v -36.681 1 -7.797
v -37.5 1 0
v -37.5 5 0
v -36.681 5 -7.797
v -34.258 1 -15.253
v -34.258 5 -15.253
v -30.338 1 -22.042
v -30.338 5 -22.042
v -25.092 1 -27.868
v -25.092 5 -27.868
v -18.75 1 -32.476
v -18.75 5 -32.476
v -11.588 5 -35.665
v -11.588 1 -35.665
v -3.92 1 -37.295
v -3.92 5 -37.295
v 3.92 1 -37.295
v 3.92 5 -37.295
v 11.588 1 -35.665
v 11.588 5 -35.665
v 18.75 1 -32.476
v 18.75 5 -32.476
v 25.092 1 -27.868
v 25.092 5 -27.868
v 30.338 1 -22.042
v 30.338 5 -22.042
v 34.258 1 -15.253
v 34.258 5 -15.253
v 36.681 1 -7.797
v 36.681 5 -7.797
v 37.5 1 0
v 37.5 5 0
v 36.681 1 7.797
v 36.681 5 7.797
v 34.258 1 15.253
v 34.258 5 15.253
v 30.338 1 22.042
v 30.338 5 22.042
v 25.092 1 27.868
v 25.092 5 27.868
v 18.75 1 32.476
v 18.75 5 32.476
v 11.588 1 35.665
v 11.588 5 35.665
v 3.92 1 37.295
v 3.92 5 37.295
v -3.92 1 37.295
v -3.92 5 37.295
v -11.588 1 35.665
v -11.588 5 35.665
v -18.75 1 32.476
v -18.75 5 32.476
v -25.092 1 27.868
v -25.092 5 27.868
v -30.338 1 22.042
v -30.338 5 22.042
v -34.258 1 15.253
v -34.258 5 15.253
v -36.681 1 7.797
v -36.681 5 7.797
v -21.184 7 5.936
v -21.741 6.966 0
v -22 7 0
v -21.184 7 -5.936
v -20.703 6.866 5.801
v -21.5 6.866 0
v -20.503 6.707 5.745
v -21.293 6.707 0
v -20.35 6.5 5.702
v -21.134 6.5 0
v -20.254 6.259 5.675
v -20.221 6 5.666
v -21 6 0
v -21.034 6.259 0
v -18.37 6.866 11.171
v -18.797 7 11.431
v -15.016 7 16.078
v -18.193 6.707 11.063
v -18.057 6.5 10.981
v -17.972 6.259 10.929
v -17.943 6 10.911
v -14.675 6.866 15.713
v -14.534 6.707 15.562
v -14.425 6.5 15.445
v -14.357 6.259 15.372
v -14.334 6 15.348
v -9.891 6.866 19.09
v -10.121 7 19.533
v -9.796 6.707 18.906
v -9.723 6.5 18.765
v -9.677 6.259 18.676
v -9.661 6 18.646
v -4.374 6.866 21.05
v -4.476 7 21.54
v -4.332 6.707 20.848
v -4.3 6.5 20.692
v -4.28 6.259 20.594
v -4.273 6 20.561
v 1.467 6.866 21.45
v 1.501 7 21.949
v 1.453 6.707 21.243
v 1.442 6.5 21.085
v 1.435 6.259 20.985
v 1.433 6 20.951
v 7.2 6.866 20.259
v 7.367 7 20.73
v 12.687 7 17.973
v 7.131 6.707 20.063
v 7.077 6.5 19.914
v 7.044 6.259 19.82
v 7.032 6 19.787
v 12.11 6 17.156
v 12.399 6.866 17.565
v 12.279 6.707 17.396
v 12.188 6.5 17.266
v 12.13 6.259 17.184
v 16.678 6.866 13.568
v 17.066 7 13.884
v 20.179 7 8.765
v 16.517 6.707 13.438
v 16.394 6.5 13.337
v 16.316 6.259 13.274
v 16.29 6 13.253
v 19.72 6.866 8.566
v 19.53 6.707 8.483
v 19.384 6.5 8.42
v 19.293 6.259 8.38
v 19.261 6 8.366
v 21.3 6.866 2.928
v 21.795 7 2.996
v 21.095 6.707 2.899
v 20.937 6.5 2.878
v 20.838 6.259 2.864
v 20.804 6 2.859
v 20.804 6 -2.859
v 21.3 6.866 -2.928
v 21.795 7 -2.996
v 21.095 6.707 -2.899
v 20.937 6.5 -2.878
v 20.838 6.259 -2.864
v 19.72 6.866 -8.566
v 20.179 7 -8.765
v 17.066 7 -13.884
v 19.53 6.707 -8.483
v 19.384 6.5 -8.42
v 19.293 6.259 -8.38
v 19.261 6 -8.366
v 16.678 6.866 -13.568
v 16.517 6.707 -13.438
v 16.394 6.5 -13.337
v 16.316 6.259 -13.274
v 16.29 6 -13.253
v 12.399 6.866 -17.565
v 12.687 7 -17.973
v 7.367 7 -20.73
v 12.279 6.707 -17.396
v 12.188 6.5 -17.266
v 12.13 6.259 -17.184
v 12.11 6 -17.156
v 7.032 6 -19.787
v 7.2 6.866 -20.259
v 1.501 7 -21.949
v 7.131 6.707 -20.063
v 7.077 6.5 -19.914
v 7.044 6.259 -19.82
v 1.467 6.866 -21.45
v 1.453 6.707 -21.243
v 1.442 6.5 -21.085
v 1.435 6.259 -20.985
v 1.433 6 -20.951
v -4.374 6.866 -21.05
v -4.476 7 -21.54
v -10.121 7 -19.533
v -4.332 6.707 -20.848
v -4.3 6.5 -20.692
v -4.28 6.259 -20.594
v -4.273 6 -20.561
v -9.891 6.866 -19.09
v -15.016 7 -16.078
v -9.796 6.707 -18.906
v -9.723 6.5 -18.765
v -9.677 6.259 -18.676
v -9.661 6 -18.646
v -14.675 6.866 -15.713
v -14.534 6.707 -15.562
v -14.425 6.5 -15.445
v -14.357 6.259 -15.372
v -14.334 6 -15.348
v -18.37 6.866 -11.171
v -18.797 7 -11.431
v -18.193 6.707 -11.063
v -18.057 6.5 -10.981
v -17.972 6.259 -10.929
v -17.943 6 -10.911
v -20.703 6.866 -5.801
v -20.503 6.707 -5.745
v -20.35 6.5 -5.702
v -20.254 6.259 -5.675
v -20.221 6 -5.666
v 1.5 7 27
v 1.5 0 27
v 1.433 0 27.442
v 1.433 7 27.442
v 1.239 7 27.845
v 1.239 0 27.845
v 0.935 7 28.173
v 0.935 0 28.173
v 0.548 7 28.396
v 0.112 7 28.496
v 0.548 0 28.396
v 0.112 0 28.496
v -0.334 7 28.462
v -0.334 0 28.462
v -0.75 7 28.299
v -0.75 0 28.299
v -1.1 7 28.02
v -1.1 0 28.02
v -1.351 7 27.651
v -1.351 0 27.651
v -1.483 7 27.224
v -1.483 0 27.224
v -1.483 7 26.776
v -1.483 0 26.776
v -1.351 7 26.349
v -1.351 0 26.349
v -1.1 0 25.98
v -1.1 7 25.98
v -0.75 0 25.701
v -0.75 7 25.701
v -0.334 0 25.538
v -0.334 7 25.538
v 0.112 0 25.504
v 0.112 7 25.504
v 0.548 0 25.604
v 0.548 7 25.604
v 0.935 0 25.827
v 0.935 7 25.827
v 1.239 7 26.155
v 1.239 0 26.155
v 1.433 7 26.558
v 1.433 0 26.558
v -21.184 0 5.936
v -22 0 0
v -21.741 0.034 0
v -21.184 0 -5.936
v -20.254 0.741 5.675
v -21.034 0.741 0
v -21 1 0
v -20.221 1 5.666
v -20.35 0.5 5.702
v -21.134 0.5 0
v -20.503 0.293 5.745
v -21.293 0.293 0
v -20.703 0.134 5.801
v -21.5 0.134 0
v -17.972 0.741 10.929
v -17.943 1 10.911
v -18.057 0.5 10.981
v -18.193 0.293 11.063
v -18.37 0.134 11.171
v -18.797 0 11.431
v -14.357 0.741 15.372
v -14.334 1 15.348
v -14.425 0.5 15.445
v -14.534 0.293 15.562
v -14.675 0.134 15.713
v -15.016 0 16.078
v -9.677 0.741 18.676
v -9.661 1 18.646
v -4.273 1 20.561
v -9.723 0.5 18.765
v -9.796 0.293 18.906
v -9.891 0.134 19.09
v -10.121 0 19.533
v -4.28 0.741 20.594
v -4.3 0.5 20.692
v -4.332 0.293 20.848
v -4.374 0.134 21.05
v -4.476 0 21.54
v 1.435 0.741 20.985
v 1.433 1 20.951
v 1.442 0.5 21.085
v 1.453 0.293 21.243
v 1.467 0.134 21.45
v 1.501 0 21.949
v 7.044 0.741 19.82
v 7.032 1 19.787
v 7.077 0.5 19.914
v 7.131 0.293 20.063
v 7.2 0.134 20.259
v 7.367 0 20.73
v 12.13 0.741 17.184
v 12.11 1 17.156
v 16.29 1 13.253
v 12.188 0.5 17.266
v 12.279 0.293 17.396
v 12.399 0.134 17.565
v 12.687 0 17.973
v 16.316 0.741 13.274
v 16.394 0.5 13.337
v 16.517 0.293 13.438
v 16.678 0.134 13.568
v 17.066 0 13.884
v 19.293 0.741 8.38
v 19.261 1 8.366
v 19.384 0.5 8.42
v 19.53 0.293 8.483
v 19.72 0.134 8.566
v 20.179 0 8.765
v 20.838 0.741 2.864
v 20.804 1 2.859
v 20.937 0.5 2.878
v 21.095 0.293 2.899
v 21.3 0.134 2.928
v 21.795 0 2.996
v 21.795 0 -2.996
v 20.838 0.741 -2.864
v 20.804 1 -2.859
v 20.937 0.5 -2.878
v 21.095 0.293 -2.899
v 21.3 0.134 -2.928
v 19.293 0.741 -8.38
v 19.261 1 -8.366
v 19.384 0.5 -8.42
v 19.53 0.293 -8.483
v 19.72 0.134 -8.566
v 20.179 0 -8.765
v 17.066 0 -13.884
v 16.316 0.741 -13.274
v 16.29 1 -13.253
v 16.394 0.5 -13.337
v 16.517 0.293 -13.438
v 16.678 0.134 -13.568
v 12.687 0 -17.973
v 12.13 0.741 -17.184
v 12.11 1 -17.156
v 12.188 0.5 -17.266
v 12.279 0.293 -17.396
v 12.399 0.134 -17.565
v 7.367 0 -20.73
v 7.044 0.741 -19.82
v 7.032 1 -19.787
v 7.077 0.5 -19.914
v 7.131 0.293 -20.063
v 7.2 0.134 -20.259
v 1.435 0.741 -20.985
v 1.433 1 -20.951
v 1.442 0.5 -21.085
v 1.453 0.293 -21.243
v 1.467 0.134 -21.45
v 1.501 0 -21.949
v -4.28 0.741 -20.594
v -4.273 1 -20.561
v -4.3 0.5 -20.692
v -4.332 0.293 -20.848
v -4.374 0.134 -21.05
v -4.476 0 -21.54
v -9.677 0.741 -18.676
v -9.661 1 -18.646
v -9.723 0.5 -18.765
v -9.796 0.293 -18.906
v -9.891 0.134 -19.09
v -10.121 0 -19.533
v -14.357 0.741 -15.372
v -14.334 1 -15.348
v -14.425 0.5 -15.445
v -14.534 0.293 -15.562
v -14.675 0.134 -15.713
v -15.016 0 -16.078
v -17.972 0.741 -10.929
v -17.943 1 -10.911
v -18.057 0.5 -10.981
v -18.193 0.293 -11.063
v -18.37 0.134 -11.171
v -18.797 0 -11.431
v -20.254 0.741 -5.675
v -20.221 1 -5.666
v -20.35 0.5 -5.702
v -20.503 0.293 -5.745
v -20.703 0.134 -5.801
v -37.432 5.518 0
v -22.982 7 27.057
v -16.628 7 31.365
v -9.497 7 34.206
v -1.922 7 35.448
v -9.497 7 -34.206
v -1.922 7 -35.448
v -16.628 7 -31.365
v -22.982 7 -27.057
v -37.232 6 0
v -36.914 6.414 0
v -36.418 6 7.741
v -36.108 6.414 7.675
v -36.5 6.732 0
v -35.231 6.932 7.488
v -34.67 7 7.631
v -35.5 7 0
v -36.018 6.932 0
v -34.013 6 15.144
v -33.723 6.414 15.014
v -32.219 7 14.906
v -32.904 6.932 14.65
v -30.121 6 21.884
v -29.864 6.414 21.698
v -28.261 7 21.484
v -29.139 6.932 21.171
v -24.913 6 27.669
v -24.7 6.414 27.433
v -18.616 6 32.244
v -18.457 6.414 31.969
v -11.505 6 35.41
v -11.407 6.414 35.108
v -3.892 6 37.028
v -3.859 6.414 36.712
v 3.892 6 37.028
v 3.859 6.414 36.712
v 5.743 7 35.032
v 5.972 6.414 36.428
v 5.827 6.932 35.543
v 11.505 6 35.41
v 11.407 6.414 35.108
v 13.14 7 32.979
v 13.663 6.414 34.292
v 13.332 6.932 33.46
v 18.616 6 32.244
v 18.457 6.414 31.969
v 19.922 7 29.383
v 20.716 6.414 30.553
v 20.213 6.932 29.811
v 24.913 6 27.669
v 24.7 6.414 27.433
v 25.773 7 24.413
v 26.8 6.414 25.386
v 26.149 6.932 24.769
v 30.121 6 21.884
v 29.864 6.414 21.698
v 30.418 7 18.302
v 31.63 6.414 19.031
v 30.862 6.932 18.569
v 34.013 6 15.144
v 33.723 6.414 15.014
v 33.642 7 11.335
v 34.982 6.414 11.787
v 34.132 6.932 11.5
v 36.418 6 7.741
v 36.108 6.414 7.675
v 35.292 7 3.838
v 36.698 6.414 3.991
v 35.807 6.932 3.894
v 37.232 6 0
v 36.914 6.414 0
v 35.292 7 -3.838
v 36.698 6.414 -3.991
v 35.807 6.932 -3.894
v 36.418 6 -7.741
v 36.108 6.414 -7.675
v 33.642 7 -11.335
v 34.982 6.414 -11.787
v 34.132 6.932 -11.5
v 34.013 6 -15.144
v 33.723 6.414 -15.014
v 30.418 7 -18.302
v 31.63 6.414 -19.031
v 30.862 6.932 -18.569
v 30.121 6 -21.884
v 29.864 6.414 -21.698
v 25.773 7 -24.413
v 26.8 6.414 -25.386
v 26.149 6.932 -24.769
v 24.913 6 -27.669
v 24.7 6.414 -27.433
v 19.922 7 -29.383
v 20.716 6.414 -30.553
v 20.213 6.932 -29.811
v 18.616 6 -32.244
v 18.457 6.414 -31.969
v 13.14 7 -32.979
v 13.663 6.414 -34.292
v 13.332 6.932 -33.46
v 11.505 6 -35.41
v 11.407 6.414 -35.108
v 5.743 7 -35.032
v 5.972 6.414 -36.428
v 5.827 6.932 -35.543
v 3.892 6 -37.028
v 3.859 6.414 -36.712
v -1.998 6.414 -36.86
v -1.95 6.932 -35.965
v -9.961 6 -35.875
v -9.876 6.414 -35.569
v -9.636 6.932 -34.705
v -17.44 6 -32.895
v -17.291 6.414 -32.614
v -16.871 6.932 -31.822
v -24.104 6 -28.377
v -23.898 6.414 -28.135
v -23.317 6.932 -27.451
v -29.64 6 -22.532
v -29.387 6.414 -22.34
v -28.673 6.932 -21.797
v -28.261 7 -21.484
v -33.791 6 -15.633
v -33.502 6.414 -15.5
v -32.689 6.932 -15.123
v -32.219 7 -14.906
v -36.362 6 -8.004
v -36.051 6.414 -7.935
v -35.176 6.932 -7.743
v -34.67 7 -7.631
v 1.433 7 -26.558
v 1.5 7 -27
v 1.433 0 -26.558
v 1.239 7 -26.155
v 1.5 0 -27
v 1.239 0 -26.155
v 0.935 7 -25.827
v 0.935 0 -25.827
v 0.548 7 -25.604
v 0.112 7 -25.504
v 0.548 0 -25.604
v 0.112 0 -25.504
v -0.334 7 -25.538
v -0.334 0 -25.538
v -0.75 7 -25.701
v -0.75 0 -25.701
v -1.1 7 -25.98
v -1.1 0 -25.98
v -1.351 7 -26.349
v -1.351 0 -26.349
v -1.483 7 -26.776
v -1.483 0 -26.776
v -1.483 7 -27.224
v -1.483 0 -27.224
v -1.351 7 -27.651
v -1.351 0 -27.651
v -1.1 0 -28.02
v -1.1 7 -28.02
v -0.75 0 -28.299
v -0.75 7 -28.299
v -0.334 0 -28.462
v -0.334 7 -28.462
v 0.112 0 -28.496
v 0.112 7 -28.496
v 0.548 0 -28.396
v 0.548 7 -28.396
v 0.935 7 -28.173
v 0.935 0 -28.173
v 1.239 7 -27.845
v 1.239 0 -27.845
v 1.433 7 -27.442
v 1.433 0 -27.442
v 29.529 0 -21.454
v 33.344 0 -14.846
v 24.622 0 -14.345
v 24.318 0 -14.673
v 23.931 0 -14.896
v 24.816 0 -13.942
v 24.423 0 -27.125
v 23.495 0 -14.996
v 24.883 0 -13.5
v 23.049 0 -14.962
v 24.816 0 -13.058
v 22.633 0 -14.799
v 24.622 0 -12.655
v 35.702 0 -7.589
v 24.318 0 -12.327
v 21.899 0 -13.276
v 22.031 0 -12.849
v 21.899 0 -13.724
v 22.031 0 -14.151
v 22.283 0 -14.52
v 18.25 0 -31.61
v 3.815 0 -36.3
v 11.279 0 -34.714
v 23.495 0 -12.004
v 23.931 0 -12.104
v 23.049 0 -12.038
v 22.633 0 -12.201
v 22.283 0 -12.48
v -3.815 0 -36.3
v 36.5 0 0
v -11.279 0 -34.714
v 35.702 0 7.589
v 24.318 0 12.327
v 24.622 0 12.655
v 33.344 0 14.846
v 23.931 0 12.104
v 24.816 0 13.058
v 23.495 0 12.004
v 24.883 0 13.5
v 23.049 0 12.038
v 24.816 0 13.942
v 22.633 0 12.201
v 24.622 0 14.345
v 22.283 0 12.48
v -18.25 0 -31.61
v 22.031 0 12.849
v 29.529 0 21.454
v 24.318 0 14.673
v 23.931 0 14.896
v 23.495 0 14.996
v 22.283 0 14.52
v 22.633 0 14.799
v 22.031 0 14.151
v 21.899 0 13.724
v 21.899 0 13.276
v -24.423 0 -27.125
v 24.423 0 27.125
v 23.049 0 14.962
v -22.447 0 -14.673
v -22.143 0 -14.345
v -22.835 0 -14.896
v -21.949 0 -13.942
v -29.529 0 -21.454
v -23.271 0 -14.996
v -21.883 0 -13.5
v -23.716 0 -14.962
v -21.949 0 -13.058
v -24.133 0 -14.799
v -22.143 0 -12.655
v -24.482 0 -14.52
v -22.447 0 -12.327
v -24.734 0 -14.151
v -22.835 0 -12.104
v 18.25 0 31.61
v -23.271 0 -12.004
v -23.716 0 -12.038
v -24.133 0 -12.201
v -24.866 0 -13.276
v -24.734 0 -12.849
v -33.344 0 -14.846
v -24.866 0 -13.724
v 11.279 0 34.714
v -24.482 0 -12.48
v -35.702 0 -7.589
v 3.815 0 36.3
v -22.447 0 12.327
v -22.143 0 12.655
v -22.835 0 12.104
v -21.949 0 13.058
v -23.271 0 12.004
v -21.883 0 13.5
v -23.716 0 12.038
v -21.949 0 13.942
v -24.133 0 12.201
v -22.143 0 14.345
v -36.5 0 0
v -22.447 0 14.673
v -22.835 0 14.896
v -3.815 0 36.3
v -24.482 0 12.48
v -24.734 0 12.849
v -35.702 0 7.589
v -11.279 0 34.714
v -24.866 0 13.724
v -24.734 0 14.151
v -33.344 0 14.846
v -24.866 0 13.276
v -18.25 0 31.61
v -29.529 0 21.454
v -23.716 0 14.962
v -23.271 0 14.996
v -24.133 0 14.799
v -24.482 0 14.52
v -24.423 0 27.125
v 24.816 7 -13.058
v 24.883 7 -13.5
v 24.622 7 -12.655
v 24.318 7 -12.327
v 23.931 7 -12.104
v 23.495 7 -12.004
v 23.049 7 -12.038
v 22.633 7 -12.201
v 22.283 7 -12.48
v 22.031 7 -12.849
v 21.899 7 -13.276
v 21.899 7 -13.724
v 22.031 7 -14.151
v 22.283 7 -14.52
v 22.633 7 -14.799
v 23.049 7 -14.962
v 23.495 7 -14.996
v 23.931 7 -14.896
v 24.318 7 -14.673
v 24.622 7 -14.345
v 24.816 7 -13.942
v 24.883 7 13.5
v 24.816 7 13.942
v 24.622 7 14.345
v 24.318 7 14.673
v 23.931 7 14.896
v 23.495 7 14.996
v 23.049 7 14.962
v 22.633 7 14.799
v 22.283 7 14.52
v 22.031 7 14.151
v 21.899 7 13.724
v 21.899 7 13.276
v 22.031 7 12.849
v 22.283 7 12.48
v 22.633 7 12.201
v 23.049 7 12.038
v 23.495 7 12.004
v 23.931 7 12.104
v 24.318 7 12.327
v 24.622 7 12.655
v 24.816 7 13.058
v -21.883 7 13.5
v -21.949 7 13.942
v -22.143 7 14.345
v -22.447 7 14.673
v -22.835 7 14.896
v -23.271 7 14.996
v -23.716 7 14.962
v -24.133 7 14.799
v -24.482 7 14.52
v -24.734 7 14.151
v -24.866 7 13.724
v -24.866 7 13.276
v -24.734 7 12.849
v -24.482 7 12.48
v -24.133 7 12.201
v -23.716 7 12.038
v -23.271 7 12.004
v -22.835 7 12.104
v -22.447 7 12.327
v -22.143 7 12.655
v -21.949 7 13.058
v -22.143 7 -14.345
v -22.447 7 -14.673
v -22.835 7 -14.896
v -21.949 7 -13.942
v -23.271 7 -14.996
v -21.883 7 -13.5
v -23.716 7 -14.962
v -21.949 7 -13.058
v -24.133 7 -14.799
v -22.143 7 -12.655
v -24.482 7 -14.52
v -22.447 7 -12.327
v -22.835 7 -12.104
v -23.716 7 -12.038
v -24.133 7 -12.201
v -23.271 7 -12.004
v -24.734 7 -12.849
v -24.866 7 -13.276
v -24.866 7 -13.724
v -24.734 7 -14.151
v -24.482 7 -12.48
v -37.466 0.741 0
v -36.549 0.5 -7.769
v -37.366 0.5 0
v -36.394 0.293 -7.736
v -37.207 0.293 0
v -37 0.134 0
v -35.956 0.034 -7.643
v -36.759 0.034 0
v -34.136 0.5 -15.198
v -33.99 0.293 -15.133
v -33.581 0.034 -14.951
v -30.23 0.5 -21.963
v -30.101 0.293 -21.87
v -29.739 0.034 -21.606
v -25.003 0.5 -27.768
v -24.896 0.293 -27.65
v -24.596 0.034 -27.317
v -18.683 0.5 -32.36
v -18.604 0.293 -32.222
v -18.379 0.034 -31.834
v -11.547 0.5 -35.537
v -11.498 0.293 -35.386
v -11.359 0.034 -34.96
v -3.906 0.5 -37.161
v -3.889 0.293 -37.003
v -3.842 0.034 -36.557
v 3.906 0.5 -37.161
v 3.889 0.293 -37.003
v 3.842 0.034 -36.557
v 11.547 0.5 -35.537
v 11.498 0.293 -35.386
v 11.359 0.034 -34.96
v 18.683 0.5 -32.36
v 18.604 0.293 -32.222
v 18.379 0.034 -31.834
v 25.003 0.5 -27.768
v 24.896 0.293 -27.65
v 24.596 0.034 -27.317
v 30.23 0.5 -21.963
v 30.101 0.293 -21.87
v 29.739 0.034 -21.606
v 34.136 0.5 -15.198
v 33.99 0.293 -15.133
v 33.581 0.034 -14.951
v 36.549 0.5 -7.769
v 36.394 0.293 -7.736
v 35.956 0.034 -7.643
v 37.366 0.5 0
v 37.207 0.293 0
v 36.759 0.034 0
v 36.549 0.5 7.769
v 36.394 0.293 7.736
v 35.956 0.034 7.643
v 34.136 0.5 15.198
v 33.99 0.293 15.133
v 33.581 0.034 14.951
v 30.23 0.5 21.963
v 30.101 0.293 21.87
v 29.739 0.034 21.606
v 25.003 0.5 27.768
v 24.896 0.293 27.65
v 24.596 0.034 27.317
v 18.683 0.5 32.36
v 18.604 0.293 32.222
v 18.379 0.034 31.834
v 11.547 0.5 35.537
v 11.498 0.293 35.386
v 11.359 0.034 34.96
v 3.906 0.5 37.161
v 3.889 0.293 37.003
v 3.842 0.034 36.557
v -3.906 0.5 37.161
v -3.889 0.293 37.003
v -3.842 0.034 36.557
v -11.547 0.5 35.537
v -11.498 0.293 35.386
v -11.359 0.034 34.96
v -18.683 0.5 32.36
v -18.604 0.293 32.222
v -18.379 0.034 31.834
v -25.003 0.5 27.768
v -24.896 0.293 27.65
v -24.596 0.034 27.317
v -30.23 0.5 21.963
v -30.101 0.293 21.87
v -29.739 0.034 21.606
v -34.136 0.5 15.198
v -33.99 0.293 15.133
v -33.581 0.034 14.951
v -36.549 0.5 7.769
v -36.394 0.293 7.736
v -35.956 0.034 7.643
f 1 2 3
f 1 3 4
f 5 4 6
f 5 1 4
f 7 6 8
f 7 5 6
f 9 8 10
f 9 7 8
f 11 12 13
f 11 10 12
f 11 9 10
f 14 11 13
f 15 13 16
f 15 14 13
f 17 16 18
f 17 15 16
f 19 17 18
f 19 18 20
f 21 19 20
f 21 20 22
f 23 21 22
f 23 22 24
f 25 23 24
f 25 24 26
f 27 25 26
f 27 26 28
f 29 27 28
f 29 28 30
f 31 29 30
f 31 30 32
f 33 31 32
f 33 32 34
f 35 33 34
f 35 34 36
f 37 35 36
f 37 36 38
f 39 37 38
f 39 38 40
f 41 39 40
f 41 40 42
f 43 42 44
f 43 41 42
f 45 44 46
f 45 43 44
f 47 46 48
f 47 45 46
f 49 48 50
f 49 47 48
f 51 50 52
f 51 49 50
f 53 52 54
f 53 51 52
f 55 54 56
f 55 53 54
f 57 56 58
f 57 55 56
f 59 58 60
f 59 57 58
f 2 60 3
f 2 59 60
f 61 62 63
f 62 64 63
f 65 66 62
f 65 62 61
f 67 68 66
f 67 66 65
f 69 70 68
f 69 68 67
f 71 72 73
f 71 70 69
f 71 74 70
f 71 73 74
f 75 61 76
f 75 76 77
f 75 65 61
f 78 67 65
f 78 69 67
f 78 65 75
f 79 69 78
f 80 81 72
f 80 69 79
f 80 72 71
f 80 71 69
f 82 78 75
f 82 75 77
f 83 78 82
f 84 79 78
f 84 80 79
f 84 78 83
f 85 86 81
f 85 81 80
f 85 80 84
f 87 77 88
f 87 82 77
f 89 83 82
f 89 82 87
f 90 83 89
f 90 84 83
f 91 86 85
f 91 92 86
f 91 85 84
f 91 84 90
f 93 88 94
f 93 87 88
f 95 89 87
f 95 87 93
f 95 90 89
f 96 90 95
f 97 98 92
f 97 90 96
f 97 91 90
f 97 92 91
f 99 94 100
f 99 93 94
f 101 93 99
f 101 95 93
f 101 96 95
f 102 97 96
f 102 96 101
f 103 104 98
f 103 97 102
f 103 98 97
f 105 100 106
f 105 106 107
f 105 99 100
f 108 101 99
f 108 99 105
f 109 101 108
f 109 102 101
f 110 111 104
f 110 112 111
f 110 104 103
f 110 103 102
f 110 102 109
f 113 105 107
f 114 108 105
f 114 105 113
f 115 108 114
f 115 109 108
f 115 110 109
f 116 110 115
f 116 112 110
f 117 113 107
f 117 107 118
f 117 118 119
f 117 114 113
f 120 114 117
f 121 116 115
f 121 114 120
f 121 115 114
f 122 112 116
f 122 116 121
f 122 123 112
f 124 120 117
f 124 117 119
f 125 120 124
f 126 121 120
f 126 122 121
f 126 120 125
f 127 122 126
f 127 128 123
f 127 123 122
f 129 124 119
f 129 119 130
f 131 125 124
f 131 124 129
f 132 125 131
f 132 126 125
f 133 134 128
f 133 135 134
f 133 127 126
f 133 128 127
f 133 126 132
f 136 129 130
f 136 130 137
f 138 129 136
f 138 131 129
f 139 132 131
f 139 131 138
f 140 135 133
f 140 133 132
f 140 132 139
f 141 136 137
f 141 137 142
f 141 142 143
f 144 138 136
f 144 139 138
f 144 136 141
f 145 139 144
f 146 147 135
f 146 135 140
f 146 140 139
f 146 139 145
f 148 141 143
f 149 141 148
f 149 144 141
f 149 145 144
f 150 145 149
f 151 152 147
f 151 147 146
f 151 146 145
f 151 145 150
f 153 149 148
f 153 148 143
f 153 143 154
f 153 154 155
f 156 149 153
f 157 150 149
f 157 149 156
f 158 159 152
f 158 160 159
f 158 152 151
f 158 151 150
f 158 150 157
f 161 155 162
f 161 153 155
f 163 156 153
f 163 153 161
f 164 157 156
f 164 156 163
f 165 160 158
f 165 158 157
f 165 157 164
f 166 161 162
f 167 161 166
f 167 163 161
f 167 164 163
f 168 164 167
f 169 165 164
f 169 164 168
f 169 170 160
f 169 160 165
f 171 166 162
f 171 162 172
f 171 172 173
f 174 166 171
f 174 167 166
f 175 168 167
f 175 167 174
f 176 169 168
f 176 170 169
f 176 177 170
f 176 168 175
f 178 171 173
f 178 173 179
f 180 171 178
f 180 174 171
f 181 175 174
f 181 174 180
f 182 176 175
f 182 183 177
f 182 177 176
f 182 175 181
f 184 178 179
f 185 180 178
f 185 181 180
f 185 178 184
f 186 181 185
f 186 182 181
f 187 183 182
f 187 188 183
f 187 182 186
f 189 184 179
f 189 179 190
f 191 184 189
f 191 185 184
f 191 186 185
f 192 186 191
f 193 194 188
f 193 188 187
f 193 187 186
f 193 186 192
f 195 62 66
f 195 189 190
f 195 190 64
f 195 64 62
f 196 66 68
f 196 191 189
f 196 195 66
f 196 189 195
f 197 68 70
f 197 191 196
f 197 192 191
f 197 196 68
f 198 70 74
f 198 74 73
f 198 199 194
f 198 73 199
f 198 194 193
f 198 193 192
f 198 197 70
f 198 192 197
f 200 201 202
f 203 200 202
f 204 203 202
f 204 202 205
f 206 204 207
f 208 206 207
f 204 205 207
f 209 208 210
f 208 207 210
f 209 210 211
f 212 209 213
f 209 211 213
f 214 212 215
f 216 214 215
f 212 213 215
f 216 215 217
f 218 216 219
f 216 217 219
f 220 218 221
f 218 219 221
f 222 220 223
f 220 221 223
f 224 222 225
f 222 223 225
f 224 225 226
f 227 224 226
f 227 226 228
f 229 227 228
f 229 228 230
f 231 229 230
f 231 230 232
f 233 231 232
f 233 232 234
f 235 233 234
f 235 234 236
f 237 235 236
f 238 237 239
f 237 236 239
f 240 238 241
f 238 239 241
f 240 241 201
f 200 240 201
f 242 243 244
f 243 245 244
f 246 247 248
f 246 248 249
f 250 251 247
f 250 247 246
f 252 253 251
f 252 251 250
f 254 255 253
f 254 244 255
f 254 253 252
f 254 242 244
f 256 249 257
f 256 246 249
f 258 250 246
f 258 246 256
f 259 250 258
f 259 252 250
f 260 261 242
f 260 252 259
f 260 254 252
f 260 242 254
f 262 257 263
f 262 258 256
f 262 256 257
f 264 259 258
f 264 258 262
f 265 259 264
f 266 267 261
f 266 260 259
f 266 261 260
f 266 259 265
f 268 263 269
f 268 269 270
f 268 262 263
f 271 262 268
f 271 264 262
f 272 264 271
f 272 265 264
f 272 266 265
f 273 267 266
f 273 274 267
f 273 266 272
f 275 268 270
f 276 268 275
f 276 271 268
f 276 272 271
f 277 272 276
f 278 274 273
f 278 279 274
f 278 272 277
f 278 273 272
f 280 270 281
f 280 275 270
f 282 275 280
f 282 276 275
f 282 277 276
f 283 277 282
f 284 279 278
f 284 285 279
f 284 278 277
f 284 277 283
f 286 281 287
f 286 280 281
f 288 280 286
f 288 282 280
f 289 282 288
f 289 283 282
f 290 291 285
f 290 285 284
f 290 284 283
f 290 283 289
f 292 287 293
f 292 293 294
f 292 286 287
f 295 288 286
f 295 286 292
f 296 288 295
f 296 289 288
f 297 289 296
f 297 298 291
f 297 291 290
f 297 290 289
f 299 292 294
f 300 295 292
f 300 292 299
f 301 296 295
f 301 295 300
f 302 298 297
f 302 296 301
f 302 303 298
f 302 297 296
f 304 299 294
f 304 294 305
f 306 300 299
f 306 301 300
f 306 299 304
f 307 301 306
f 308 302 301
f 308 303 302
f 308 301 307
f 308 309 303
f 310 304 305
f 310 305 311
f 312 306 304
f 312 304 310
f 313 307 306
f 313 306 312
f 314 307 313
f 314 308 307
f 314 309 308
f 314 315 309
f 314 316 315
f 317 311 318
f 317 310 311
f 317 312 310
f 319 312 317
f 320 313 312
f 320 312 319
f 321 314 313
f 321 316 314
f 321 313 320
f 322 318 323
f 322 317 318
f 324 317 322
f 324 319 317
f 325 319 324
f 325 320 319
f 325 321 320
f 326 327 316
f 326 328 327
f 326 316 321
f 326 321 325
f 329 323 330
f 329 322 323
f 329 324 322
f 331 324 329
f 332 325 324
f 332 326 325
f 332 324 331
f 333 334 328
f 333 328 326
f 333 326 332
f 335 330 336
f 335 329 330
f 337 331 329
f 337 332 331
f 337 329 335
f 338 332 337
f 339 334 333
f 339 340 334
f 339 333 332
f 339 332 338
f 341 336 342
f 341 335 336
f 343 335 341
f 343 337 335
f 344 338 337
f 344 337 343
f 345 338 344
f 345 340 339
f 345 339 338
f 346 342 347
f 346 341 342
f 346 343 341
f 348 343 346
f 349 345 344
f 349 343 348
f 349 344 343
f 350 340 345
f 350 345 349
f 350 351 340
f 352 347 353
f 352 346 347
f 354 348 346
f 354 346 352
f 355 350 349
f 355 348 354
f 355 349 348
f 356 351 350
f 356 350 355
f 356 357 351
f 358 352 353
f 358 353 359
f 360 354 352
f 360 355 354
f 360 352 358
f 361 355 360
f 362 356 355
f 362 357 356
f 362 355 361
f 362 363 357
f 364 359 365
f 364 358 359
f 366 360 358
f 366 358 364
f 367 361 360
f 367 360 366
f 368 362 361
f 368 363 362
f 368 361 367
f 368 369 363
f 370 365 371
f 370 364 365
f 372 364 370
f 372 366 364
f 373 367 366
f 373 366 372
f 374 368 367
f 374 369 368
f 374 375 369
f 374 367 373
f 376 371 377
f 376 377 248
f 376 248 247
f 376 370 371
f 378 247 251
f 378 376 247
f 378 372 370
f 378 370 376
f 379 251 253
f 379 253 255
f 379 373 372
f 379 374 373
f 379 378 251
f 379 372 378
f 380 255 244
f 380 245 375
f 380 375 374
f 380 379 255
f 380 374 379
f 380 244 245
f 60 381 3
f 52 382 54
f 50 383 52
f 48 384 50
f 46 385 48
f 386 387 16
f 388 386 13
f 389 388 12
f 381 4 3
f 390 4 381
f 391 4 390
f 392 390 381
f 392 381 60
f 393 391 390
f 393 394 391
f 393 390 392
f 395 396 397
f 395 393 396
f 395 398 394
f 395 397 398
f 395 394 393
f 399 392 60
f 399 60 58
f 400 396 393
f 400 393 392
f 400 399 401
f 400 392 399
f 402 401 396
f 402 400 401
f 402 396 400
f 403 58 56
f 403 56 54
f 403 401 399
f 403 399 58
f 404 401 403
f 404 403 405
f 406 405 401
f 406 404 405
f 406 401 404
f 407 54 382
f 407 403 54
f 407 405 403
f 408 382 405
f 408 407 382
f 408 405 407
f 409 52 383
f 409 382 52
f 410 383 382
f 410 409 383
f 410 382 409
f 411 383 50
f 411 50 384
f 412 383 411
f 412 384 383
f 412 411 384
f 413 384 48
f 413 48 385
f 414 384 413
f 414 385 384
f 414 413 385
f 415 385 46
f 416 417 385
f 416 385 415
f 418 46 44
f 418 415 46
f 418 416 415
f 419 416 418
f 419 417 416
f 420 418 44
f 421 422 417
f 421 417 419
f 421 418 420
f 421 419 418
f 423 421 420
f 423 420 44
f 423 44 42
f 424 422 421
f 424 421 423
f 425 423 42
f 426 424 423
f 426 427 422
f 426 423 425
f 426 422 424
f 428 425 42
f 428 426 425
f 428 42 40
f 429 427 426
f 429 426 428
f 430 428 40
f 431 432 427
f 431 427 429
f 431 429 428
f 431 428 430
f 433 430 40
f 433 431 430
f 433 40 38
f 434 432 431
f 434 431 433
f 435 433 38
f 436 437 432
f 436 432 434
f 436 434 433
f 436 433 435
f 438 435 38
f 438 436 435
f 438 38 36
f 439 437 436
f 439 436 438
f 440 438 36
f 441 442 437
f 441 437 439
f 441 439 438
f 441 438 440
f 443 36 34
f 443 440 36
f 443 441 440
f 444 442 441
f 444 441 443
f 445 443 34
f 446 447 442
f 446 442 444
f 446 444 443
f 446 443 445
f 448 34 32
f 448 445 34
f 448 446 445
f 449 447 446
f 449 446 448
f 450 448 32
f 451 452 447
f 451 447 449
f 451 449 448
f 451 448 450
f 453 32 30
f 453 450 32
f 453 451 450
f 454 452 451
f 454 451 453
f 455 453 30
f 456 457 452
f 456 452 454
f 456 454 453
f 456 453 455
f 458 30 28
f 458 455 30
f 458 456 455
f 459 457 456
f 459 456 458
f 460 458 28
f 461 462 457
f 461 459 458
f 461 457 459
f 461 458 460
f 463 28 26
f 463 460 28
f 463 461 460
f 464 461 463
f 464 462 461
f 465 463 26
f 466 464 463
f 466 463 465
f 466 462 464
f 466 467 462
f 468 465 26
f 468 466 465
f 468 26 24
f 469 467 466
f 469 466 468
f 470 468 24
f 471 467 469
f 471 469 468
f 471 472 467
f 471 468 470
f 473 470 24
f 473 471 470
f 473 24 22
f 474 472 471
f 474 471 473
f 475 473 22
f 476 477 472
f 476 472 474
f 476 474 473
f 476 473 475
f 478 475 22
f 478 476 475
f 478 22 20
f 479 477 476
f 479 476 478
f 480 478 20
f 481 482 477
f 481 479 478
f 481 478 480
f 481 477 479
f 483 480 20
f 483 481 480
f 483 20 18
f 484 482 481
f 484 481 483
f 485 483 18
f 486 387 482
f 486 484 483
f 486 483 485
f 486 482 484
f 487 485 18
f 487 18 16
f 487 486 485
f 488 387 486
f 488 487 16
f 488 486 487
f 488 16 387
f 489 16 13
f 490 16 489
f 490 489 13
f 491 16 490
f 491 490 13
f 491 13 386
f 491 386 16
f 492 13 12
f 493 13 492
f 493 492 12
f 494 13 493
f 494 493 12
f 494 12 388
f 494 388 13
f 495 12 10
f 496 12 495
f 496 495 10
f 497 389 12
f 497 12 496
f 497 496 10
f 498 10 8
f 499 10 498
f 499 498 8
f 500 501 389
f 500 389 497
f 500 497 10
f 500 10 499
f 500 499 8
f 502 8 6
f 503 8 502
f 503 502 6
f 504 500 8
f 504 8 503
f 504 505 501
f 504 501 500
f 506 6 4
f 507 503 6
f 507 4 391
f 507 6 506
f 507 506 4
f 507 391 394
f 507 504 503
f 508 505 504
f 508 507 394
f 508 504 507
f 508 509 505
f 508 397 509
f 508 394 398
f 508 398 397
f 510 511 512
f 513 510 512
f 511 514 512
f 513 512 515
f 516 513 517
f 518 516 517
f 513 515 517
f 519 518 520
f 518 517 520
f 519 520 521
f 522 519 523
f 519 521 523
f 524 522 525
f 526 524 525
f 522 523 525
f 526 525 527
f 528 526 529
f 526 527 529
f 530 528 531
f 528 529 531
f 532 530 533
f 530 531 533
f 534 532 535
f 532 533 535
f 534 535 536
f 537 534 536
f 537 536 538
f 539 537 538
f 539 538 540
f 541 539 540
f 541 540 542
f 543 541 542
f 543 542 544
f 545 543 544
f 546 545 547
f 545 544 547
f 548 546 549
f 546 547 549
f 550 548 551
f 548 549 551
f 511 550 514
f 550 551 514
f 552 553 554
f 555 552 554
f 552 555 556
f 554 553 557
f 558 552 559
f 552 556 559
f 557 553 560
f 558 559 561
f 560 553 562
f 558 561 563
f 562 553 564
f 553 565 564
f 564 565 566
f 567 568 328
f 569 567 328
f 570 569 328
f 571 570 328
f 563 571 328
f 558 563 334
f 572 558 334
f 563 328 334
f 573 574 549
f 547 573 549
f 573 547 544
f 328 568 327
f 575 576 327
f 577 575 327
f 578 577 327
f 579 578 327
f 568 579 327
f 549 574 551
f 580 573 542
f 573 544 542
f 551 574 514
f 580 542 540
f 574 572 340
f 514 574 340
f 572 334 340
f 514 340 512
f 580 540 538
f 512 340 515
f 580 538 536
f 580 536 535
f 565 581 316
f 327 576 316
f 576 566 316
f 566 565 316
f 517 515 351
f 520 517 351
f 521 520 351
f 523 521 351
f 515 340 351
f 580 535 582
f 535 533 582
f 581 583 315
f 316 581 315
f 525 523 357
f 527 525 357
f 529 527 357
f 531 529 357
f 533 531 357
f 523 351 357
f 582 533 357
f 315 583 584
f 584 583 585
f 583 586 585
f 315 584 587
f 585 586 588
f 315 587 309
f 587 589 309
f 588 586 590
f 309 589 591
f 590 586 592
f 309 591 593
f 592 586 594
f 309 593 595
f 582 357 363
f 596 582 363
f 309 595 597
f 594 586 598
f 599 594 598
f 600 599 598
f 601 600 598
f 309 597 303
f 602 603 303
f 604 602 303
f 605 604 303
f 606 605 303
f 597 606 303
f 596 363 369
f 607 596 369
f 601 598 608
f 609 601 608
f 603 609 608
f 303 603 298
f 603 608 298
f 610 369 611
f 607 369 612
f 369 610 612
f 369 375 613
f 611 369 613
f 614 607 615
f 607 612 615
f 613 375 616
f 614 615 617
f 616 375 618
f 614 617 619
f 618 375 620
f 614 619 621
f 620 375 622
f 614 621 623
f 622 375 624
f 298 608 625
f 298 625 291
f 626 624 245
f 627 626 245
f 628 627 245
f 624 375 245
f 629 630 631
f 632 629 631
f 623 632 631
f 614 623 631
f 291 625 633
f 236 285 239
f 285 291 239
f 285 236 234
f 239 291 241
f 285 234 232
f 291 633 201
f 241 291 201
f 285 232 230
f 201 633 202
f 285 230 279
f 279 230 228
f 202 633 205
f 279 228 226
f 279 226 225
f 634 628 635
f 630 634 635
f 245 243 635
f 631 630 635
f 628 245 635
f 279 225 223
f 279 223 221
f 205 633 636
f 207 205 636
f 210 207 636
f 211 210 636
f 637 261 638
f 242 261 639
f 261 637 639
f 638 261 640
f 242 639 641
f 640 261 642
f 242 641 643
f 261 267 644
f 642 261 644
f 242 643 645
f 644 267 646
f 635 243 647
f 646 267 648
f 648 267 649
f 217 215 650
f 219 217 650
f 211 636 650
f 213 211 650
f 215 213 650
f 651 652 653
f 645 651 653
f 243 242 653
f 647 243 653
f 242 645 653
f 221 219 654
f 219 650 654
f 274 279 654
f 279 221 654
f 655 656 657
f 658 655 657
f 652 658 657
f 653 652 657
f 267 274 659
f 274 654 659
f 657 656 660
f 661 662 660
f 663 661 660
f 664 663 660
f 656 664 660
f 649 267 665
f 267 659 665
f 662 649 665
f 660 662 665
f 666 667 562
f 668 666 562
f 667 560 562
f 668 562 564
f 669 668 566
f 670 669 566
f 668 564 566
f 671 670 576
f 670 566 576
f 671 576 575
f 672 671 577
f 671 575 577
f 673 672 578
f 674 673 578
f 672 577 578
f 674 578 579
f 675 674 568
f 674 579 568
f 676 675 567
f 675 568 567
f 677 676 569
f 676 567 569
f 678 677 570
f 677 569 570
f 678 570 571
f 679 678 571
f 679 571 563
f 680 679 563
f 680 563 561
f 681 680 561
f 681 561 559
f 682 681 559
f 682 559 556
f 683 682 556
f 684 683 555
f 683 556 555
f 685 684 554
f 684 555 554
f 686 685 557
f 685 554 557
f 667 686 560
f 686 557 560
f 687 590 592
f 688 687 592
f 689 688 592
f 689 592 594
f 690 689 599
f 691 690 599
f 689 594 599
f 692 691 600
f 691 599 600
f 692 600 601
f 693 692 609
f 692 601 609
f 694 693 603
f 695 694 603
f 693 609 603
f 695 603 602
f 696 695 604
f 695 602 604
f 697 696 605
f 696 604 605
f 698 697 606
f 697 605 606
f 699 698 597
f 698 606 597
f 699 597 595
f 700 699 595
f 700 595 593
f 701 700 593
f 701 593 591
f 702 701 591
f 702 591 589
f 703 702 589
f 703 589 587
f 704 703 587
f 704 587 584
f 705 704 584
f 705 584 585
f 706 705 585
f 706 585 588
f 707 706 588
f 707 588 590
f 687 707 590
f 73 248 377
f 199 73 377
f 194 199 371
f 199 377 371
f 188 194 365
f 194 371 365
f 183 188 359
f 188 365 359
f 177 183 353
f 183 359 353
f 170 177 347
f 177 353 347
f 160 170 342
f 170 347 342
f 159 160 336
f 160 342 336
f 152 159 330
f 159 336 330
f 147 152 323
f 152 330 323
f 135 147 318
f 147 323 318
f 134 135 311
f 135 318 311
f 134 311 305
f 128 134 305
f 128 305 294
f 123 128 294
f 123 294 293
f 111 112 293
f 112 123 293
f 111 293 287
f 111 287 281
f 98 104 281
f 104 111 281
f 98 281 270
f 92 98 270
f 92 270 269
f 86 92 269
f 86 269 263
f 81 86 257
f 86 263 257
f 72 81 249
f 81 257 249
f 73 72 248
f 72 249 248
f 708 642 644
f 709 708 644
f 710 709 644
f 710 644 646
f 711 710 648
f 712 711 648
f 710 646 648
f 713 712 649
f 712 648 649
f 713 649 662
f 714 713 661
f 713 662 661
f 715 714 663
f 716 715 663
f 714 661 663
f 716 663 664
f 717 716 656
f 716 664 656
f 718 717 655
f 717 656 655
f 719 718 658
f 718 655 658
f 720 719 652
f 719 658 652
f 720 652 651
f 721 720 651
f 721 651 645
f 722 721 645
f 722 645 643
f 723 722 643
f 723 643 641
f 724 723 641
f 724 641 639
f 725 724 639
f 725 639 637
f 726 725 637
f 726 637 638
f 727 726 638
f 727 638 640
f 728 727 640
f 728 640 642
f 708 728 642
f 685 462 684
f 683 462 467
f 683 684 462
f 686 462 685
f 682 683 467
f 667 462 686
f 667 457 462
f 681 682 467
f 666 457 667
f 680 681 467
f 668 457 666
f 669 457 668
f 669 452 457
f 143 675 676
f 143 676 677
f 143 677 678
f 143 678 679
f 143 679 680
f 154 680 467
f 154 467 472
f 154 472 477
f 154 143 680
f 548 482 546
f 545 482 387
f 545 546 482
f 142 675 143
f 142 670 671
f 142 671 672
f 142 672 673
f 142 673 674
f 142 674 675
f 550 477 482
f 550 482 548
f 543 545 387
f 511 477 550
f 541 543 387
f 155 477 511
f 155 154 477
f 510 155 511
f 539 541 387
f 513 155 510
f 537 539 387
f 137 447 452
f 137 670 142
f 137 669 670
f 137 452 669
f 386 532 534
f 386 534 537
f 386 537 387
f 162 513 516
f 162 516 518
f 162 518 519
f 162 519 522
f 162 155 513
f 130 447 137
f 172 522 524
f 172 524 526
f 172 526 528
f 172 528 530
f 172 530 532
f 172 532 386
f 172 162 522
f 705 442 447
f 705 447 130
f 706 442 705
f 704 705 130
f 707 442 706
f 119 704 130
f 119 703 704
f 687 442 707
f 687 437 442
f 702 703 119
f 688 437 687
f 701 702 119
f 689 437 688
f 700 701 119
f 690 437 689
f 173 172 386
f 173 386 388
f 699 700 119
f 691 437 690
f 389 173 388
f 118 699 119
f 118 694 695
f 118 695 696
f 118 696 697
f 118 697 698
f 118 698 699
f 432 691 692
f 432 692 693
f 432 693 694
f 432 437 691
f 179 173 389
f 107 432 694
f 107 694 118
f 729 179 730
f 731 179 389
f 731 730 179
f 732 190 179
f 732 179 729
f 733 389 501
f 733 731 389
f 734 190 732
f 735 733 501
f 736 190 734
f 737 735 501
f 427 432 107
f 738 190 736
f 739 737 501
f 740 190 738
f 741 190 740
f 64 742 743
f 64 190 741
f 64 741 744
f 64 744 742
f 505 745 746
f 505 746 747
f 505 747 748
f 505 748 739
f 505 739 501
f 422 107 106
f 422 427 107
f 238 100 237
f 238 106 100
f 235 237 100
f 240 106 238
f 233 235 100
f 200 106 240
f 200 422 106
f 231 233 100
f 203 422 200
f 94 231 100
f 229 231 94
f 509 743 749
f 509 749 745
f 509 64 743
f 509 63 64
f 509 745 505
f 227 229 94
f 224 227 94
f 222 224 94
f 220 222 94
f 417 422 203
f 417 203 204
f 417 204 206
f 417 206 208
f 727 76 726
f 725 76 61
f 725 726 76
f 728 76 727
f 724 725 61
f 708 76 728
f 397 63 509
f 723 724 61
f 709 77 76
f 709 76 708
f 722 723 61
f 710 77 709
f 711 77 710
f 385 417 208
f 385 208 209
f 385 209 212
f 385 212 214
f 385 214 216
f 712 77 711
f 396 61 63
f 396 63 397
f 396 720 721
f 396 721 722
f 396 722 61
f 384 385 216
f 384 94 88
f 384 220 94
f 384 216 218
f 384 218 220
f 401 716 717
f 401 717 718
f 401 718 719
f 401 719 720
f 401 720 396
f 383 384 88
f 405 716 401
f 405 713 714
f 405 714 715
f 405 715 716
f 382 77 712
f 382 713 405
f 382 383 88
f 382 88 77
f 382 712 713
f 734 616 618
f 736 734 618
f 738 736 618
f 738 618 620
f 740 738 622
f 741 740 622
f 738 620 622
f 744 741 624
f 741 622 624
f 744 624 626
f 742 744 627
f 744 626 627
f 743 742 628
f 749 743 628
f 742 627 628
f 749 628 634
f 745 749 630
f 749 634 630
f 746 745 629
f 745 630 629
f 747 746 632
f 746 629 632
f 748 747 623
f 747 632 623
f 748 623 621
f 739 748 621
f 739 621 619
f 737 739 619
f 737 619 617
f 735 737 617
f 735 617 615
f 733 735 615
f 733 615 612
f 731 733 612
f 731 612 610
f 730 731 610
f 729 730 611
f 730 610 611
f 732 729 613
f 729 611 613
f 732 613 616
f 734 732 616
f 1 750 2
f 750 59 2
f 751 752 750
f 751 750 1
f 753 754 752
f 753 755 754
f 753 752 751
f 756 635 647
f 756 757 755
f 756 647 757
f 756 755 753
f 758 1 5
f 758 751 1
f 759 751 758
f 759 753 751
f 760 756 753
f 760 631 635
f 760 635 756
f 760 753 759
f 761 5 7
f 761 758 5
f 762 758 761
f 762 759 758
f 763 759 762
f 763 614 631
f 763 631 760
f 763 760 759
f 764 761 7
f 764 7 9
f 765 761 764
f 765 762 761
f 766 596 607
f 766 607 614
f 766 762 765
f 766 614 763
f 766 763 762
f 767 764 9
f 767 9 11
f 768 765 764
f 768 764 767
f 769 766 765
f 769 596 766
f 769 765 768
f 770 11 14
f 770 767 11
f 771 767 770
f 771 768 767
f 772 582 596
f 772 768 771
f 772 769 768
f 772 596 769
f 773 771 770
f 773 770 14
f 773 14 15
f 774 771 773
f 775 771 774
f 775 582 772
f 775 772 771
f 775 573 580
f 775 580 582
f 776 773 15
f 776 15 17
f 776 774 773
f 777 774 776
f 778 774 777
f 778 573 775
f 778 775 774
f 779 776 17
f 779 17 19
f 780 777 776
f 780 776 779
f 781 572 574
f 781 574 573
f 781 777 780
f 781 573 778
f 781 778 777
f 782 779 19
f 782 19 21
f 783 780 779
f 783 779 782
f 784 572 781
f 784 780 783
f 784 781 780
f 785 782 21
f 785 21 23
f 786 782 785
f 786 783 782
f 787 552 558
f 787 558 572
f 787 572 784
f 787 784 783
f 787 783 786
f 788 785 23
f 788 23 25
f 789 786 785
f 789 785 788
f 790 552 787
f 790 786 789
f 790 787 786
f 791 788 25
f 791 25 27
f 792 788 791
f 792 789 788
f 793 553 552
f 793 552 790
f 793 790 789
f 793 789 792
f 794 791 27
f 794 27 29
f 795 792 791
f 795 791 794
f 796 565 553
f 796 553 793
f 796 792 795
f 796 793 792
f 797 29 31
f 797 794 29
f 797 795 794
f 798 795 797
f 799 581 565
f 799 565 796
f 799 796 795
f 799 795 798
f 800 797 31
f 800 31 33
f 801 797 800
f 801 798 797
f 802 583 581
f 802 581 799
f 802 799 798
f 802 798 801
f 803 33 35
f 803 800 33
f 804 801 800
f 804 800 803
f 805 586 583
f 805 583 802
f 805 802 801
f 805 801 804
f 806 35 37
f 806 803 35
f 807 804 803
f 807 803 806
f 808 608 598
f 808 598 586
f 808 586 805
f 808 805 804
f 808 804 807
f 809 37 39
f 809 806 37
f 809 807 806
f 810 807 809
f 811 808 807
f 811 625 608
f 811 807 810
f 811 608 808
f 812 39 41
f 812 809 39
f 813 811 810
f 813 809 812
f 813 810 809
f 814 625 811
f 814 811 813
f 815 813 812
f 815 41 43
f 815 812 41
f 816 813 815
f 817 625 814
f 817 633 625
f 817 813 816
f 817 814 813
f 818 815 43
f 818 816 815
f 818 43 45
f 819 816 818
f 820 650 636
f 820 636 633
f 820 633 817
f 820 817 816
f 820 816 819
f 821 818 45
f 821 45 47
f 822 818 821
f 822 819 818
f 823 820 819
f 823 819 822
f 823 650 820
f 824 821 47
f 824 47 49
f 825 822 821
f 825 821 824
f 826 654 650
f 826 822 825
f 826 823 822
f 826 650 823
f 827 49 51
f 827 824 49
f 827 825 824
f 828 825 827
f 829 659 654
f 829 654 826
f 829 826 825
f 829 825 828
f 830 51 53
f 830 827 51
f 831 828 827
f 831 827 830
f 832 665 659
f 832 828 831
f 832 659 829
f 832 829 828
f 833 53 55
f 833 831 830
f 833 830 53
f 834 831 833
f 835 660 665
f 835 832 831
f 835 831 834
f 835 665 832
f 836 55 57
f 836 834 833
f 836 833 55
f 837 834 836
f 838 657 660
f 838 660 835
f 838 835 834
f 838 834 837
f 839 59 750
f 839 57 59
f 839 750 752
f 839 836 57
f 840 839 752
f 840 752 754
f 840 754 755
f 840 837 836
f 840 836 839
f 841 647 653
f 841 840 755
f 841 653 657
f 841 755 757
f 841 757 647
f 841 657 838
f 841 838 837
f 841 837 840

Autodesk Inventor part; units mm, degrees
ref_plane "YZ Plane" through (0, 0, 0) normal (1, 0, 0) x (0, 1, 0)
ref_plane "XZ Plane" through (0, 0, 0) normal (0, 1, 0) x (-1, 0, 0)
ref_plane "XY Plane" through (0, 0, 0) normal (0, 0, 1) x (1, 0, 0)
sketch "Esquisse1" plane through (0, 0, 0) normal (0, 1, 0) x (-1, 0, 0)
  circle A0 centre (0, 0) radius 37.5
  circle A1 centre (0, 0) radius 21
  dimension "d0" = 75
  dimension "d1" = 42
extrude "Extrusion1" add sketch "Esquisse1" along normal blind 7
fillet "Congé1" radius 2 1 edges at (37.5, 7, 0)
fillet "Congé2" radius 1 1 edges at (21, 7, 0)
fillet "Congé3" radius 1 2 edges at (37.5, 0, 0) (21, 0, 0)
sketch "Esquisse2" plane through (0, 0, 0) normal (0, -1, 0) x (1, 0, 0)
  circle A0 centre (0, 0) radius 36.5 projected
  circle A1 centre (0, 0) radius 22 projected
  line L0 (0, 0) -> (0, 36.5) construction
  circle A2 centre (0, 27) radius 1.5
  circle A3 centre (-23.3827, 13.5) radius 1.5
  circle A4 centre (-23.3827, -13.5) radius 1.5
  circle A5 centre (0, -27) radius 1.5
  circle A6 centre (23.3827, -13.5) radius 1.5
  circle A7 centre (23.3827, 13.5) radius 1.5
  dimension "d7" = 27
  dimension "d8" = 3
  dimension "d11" = 360
extrude "Extrusion2" cut sketch "Esquisse2" against normal through all contours A2 | A3 | A4 | A5 | A6 | A7
properties part number "encoder_wheel"
